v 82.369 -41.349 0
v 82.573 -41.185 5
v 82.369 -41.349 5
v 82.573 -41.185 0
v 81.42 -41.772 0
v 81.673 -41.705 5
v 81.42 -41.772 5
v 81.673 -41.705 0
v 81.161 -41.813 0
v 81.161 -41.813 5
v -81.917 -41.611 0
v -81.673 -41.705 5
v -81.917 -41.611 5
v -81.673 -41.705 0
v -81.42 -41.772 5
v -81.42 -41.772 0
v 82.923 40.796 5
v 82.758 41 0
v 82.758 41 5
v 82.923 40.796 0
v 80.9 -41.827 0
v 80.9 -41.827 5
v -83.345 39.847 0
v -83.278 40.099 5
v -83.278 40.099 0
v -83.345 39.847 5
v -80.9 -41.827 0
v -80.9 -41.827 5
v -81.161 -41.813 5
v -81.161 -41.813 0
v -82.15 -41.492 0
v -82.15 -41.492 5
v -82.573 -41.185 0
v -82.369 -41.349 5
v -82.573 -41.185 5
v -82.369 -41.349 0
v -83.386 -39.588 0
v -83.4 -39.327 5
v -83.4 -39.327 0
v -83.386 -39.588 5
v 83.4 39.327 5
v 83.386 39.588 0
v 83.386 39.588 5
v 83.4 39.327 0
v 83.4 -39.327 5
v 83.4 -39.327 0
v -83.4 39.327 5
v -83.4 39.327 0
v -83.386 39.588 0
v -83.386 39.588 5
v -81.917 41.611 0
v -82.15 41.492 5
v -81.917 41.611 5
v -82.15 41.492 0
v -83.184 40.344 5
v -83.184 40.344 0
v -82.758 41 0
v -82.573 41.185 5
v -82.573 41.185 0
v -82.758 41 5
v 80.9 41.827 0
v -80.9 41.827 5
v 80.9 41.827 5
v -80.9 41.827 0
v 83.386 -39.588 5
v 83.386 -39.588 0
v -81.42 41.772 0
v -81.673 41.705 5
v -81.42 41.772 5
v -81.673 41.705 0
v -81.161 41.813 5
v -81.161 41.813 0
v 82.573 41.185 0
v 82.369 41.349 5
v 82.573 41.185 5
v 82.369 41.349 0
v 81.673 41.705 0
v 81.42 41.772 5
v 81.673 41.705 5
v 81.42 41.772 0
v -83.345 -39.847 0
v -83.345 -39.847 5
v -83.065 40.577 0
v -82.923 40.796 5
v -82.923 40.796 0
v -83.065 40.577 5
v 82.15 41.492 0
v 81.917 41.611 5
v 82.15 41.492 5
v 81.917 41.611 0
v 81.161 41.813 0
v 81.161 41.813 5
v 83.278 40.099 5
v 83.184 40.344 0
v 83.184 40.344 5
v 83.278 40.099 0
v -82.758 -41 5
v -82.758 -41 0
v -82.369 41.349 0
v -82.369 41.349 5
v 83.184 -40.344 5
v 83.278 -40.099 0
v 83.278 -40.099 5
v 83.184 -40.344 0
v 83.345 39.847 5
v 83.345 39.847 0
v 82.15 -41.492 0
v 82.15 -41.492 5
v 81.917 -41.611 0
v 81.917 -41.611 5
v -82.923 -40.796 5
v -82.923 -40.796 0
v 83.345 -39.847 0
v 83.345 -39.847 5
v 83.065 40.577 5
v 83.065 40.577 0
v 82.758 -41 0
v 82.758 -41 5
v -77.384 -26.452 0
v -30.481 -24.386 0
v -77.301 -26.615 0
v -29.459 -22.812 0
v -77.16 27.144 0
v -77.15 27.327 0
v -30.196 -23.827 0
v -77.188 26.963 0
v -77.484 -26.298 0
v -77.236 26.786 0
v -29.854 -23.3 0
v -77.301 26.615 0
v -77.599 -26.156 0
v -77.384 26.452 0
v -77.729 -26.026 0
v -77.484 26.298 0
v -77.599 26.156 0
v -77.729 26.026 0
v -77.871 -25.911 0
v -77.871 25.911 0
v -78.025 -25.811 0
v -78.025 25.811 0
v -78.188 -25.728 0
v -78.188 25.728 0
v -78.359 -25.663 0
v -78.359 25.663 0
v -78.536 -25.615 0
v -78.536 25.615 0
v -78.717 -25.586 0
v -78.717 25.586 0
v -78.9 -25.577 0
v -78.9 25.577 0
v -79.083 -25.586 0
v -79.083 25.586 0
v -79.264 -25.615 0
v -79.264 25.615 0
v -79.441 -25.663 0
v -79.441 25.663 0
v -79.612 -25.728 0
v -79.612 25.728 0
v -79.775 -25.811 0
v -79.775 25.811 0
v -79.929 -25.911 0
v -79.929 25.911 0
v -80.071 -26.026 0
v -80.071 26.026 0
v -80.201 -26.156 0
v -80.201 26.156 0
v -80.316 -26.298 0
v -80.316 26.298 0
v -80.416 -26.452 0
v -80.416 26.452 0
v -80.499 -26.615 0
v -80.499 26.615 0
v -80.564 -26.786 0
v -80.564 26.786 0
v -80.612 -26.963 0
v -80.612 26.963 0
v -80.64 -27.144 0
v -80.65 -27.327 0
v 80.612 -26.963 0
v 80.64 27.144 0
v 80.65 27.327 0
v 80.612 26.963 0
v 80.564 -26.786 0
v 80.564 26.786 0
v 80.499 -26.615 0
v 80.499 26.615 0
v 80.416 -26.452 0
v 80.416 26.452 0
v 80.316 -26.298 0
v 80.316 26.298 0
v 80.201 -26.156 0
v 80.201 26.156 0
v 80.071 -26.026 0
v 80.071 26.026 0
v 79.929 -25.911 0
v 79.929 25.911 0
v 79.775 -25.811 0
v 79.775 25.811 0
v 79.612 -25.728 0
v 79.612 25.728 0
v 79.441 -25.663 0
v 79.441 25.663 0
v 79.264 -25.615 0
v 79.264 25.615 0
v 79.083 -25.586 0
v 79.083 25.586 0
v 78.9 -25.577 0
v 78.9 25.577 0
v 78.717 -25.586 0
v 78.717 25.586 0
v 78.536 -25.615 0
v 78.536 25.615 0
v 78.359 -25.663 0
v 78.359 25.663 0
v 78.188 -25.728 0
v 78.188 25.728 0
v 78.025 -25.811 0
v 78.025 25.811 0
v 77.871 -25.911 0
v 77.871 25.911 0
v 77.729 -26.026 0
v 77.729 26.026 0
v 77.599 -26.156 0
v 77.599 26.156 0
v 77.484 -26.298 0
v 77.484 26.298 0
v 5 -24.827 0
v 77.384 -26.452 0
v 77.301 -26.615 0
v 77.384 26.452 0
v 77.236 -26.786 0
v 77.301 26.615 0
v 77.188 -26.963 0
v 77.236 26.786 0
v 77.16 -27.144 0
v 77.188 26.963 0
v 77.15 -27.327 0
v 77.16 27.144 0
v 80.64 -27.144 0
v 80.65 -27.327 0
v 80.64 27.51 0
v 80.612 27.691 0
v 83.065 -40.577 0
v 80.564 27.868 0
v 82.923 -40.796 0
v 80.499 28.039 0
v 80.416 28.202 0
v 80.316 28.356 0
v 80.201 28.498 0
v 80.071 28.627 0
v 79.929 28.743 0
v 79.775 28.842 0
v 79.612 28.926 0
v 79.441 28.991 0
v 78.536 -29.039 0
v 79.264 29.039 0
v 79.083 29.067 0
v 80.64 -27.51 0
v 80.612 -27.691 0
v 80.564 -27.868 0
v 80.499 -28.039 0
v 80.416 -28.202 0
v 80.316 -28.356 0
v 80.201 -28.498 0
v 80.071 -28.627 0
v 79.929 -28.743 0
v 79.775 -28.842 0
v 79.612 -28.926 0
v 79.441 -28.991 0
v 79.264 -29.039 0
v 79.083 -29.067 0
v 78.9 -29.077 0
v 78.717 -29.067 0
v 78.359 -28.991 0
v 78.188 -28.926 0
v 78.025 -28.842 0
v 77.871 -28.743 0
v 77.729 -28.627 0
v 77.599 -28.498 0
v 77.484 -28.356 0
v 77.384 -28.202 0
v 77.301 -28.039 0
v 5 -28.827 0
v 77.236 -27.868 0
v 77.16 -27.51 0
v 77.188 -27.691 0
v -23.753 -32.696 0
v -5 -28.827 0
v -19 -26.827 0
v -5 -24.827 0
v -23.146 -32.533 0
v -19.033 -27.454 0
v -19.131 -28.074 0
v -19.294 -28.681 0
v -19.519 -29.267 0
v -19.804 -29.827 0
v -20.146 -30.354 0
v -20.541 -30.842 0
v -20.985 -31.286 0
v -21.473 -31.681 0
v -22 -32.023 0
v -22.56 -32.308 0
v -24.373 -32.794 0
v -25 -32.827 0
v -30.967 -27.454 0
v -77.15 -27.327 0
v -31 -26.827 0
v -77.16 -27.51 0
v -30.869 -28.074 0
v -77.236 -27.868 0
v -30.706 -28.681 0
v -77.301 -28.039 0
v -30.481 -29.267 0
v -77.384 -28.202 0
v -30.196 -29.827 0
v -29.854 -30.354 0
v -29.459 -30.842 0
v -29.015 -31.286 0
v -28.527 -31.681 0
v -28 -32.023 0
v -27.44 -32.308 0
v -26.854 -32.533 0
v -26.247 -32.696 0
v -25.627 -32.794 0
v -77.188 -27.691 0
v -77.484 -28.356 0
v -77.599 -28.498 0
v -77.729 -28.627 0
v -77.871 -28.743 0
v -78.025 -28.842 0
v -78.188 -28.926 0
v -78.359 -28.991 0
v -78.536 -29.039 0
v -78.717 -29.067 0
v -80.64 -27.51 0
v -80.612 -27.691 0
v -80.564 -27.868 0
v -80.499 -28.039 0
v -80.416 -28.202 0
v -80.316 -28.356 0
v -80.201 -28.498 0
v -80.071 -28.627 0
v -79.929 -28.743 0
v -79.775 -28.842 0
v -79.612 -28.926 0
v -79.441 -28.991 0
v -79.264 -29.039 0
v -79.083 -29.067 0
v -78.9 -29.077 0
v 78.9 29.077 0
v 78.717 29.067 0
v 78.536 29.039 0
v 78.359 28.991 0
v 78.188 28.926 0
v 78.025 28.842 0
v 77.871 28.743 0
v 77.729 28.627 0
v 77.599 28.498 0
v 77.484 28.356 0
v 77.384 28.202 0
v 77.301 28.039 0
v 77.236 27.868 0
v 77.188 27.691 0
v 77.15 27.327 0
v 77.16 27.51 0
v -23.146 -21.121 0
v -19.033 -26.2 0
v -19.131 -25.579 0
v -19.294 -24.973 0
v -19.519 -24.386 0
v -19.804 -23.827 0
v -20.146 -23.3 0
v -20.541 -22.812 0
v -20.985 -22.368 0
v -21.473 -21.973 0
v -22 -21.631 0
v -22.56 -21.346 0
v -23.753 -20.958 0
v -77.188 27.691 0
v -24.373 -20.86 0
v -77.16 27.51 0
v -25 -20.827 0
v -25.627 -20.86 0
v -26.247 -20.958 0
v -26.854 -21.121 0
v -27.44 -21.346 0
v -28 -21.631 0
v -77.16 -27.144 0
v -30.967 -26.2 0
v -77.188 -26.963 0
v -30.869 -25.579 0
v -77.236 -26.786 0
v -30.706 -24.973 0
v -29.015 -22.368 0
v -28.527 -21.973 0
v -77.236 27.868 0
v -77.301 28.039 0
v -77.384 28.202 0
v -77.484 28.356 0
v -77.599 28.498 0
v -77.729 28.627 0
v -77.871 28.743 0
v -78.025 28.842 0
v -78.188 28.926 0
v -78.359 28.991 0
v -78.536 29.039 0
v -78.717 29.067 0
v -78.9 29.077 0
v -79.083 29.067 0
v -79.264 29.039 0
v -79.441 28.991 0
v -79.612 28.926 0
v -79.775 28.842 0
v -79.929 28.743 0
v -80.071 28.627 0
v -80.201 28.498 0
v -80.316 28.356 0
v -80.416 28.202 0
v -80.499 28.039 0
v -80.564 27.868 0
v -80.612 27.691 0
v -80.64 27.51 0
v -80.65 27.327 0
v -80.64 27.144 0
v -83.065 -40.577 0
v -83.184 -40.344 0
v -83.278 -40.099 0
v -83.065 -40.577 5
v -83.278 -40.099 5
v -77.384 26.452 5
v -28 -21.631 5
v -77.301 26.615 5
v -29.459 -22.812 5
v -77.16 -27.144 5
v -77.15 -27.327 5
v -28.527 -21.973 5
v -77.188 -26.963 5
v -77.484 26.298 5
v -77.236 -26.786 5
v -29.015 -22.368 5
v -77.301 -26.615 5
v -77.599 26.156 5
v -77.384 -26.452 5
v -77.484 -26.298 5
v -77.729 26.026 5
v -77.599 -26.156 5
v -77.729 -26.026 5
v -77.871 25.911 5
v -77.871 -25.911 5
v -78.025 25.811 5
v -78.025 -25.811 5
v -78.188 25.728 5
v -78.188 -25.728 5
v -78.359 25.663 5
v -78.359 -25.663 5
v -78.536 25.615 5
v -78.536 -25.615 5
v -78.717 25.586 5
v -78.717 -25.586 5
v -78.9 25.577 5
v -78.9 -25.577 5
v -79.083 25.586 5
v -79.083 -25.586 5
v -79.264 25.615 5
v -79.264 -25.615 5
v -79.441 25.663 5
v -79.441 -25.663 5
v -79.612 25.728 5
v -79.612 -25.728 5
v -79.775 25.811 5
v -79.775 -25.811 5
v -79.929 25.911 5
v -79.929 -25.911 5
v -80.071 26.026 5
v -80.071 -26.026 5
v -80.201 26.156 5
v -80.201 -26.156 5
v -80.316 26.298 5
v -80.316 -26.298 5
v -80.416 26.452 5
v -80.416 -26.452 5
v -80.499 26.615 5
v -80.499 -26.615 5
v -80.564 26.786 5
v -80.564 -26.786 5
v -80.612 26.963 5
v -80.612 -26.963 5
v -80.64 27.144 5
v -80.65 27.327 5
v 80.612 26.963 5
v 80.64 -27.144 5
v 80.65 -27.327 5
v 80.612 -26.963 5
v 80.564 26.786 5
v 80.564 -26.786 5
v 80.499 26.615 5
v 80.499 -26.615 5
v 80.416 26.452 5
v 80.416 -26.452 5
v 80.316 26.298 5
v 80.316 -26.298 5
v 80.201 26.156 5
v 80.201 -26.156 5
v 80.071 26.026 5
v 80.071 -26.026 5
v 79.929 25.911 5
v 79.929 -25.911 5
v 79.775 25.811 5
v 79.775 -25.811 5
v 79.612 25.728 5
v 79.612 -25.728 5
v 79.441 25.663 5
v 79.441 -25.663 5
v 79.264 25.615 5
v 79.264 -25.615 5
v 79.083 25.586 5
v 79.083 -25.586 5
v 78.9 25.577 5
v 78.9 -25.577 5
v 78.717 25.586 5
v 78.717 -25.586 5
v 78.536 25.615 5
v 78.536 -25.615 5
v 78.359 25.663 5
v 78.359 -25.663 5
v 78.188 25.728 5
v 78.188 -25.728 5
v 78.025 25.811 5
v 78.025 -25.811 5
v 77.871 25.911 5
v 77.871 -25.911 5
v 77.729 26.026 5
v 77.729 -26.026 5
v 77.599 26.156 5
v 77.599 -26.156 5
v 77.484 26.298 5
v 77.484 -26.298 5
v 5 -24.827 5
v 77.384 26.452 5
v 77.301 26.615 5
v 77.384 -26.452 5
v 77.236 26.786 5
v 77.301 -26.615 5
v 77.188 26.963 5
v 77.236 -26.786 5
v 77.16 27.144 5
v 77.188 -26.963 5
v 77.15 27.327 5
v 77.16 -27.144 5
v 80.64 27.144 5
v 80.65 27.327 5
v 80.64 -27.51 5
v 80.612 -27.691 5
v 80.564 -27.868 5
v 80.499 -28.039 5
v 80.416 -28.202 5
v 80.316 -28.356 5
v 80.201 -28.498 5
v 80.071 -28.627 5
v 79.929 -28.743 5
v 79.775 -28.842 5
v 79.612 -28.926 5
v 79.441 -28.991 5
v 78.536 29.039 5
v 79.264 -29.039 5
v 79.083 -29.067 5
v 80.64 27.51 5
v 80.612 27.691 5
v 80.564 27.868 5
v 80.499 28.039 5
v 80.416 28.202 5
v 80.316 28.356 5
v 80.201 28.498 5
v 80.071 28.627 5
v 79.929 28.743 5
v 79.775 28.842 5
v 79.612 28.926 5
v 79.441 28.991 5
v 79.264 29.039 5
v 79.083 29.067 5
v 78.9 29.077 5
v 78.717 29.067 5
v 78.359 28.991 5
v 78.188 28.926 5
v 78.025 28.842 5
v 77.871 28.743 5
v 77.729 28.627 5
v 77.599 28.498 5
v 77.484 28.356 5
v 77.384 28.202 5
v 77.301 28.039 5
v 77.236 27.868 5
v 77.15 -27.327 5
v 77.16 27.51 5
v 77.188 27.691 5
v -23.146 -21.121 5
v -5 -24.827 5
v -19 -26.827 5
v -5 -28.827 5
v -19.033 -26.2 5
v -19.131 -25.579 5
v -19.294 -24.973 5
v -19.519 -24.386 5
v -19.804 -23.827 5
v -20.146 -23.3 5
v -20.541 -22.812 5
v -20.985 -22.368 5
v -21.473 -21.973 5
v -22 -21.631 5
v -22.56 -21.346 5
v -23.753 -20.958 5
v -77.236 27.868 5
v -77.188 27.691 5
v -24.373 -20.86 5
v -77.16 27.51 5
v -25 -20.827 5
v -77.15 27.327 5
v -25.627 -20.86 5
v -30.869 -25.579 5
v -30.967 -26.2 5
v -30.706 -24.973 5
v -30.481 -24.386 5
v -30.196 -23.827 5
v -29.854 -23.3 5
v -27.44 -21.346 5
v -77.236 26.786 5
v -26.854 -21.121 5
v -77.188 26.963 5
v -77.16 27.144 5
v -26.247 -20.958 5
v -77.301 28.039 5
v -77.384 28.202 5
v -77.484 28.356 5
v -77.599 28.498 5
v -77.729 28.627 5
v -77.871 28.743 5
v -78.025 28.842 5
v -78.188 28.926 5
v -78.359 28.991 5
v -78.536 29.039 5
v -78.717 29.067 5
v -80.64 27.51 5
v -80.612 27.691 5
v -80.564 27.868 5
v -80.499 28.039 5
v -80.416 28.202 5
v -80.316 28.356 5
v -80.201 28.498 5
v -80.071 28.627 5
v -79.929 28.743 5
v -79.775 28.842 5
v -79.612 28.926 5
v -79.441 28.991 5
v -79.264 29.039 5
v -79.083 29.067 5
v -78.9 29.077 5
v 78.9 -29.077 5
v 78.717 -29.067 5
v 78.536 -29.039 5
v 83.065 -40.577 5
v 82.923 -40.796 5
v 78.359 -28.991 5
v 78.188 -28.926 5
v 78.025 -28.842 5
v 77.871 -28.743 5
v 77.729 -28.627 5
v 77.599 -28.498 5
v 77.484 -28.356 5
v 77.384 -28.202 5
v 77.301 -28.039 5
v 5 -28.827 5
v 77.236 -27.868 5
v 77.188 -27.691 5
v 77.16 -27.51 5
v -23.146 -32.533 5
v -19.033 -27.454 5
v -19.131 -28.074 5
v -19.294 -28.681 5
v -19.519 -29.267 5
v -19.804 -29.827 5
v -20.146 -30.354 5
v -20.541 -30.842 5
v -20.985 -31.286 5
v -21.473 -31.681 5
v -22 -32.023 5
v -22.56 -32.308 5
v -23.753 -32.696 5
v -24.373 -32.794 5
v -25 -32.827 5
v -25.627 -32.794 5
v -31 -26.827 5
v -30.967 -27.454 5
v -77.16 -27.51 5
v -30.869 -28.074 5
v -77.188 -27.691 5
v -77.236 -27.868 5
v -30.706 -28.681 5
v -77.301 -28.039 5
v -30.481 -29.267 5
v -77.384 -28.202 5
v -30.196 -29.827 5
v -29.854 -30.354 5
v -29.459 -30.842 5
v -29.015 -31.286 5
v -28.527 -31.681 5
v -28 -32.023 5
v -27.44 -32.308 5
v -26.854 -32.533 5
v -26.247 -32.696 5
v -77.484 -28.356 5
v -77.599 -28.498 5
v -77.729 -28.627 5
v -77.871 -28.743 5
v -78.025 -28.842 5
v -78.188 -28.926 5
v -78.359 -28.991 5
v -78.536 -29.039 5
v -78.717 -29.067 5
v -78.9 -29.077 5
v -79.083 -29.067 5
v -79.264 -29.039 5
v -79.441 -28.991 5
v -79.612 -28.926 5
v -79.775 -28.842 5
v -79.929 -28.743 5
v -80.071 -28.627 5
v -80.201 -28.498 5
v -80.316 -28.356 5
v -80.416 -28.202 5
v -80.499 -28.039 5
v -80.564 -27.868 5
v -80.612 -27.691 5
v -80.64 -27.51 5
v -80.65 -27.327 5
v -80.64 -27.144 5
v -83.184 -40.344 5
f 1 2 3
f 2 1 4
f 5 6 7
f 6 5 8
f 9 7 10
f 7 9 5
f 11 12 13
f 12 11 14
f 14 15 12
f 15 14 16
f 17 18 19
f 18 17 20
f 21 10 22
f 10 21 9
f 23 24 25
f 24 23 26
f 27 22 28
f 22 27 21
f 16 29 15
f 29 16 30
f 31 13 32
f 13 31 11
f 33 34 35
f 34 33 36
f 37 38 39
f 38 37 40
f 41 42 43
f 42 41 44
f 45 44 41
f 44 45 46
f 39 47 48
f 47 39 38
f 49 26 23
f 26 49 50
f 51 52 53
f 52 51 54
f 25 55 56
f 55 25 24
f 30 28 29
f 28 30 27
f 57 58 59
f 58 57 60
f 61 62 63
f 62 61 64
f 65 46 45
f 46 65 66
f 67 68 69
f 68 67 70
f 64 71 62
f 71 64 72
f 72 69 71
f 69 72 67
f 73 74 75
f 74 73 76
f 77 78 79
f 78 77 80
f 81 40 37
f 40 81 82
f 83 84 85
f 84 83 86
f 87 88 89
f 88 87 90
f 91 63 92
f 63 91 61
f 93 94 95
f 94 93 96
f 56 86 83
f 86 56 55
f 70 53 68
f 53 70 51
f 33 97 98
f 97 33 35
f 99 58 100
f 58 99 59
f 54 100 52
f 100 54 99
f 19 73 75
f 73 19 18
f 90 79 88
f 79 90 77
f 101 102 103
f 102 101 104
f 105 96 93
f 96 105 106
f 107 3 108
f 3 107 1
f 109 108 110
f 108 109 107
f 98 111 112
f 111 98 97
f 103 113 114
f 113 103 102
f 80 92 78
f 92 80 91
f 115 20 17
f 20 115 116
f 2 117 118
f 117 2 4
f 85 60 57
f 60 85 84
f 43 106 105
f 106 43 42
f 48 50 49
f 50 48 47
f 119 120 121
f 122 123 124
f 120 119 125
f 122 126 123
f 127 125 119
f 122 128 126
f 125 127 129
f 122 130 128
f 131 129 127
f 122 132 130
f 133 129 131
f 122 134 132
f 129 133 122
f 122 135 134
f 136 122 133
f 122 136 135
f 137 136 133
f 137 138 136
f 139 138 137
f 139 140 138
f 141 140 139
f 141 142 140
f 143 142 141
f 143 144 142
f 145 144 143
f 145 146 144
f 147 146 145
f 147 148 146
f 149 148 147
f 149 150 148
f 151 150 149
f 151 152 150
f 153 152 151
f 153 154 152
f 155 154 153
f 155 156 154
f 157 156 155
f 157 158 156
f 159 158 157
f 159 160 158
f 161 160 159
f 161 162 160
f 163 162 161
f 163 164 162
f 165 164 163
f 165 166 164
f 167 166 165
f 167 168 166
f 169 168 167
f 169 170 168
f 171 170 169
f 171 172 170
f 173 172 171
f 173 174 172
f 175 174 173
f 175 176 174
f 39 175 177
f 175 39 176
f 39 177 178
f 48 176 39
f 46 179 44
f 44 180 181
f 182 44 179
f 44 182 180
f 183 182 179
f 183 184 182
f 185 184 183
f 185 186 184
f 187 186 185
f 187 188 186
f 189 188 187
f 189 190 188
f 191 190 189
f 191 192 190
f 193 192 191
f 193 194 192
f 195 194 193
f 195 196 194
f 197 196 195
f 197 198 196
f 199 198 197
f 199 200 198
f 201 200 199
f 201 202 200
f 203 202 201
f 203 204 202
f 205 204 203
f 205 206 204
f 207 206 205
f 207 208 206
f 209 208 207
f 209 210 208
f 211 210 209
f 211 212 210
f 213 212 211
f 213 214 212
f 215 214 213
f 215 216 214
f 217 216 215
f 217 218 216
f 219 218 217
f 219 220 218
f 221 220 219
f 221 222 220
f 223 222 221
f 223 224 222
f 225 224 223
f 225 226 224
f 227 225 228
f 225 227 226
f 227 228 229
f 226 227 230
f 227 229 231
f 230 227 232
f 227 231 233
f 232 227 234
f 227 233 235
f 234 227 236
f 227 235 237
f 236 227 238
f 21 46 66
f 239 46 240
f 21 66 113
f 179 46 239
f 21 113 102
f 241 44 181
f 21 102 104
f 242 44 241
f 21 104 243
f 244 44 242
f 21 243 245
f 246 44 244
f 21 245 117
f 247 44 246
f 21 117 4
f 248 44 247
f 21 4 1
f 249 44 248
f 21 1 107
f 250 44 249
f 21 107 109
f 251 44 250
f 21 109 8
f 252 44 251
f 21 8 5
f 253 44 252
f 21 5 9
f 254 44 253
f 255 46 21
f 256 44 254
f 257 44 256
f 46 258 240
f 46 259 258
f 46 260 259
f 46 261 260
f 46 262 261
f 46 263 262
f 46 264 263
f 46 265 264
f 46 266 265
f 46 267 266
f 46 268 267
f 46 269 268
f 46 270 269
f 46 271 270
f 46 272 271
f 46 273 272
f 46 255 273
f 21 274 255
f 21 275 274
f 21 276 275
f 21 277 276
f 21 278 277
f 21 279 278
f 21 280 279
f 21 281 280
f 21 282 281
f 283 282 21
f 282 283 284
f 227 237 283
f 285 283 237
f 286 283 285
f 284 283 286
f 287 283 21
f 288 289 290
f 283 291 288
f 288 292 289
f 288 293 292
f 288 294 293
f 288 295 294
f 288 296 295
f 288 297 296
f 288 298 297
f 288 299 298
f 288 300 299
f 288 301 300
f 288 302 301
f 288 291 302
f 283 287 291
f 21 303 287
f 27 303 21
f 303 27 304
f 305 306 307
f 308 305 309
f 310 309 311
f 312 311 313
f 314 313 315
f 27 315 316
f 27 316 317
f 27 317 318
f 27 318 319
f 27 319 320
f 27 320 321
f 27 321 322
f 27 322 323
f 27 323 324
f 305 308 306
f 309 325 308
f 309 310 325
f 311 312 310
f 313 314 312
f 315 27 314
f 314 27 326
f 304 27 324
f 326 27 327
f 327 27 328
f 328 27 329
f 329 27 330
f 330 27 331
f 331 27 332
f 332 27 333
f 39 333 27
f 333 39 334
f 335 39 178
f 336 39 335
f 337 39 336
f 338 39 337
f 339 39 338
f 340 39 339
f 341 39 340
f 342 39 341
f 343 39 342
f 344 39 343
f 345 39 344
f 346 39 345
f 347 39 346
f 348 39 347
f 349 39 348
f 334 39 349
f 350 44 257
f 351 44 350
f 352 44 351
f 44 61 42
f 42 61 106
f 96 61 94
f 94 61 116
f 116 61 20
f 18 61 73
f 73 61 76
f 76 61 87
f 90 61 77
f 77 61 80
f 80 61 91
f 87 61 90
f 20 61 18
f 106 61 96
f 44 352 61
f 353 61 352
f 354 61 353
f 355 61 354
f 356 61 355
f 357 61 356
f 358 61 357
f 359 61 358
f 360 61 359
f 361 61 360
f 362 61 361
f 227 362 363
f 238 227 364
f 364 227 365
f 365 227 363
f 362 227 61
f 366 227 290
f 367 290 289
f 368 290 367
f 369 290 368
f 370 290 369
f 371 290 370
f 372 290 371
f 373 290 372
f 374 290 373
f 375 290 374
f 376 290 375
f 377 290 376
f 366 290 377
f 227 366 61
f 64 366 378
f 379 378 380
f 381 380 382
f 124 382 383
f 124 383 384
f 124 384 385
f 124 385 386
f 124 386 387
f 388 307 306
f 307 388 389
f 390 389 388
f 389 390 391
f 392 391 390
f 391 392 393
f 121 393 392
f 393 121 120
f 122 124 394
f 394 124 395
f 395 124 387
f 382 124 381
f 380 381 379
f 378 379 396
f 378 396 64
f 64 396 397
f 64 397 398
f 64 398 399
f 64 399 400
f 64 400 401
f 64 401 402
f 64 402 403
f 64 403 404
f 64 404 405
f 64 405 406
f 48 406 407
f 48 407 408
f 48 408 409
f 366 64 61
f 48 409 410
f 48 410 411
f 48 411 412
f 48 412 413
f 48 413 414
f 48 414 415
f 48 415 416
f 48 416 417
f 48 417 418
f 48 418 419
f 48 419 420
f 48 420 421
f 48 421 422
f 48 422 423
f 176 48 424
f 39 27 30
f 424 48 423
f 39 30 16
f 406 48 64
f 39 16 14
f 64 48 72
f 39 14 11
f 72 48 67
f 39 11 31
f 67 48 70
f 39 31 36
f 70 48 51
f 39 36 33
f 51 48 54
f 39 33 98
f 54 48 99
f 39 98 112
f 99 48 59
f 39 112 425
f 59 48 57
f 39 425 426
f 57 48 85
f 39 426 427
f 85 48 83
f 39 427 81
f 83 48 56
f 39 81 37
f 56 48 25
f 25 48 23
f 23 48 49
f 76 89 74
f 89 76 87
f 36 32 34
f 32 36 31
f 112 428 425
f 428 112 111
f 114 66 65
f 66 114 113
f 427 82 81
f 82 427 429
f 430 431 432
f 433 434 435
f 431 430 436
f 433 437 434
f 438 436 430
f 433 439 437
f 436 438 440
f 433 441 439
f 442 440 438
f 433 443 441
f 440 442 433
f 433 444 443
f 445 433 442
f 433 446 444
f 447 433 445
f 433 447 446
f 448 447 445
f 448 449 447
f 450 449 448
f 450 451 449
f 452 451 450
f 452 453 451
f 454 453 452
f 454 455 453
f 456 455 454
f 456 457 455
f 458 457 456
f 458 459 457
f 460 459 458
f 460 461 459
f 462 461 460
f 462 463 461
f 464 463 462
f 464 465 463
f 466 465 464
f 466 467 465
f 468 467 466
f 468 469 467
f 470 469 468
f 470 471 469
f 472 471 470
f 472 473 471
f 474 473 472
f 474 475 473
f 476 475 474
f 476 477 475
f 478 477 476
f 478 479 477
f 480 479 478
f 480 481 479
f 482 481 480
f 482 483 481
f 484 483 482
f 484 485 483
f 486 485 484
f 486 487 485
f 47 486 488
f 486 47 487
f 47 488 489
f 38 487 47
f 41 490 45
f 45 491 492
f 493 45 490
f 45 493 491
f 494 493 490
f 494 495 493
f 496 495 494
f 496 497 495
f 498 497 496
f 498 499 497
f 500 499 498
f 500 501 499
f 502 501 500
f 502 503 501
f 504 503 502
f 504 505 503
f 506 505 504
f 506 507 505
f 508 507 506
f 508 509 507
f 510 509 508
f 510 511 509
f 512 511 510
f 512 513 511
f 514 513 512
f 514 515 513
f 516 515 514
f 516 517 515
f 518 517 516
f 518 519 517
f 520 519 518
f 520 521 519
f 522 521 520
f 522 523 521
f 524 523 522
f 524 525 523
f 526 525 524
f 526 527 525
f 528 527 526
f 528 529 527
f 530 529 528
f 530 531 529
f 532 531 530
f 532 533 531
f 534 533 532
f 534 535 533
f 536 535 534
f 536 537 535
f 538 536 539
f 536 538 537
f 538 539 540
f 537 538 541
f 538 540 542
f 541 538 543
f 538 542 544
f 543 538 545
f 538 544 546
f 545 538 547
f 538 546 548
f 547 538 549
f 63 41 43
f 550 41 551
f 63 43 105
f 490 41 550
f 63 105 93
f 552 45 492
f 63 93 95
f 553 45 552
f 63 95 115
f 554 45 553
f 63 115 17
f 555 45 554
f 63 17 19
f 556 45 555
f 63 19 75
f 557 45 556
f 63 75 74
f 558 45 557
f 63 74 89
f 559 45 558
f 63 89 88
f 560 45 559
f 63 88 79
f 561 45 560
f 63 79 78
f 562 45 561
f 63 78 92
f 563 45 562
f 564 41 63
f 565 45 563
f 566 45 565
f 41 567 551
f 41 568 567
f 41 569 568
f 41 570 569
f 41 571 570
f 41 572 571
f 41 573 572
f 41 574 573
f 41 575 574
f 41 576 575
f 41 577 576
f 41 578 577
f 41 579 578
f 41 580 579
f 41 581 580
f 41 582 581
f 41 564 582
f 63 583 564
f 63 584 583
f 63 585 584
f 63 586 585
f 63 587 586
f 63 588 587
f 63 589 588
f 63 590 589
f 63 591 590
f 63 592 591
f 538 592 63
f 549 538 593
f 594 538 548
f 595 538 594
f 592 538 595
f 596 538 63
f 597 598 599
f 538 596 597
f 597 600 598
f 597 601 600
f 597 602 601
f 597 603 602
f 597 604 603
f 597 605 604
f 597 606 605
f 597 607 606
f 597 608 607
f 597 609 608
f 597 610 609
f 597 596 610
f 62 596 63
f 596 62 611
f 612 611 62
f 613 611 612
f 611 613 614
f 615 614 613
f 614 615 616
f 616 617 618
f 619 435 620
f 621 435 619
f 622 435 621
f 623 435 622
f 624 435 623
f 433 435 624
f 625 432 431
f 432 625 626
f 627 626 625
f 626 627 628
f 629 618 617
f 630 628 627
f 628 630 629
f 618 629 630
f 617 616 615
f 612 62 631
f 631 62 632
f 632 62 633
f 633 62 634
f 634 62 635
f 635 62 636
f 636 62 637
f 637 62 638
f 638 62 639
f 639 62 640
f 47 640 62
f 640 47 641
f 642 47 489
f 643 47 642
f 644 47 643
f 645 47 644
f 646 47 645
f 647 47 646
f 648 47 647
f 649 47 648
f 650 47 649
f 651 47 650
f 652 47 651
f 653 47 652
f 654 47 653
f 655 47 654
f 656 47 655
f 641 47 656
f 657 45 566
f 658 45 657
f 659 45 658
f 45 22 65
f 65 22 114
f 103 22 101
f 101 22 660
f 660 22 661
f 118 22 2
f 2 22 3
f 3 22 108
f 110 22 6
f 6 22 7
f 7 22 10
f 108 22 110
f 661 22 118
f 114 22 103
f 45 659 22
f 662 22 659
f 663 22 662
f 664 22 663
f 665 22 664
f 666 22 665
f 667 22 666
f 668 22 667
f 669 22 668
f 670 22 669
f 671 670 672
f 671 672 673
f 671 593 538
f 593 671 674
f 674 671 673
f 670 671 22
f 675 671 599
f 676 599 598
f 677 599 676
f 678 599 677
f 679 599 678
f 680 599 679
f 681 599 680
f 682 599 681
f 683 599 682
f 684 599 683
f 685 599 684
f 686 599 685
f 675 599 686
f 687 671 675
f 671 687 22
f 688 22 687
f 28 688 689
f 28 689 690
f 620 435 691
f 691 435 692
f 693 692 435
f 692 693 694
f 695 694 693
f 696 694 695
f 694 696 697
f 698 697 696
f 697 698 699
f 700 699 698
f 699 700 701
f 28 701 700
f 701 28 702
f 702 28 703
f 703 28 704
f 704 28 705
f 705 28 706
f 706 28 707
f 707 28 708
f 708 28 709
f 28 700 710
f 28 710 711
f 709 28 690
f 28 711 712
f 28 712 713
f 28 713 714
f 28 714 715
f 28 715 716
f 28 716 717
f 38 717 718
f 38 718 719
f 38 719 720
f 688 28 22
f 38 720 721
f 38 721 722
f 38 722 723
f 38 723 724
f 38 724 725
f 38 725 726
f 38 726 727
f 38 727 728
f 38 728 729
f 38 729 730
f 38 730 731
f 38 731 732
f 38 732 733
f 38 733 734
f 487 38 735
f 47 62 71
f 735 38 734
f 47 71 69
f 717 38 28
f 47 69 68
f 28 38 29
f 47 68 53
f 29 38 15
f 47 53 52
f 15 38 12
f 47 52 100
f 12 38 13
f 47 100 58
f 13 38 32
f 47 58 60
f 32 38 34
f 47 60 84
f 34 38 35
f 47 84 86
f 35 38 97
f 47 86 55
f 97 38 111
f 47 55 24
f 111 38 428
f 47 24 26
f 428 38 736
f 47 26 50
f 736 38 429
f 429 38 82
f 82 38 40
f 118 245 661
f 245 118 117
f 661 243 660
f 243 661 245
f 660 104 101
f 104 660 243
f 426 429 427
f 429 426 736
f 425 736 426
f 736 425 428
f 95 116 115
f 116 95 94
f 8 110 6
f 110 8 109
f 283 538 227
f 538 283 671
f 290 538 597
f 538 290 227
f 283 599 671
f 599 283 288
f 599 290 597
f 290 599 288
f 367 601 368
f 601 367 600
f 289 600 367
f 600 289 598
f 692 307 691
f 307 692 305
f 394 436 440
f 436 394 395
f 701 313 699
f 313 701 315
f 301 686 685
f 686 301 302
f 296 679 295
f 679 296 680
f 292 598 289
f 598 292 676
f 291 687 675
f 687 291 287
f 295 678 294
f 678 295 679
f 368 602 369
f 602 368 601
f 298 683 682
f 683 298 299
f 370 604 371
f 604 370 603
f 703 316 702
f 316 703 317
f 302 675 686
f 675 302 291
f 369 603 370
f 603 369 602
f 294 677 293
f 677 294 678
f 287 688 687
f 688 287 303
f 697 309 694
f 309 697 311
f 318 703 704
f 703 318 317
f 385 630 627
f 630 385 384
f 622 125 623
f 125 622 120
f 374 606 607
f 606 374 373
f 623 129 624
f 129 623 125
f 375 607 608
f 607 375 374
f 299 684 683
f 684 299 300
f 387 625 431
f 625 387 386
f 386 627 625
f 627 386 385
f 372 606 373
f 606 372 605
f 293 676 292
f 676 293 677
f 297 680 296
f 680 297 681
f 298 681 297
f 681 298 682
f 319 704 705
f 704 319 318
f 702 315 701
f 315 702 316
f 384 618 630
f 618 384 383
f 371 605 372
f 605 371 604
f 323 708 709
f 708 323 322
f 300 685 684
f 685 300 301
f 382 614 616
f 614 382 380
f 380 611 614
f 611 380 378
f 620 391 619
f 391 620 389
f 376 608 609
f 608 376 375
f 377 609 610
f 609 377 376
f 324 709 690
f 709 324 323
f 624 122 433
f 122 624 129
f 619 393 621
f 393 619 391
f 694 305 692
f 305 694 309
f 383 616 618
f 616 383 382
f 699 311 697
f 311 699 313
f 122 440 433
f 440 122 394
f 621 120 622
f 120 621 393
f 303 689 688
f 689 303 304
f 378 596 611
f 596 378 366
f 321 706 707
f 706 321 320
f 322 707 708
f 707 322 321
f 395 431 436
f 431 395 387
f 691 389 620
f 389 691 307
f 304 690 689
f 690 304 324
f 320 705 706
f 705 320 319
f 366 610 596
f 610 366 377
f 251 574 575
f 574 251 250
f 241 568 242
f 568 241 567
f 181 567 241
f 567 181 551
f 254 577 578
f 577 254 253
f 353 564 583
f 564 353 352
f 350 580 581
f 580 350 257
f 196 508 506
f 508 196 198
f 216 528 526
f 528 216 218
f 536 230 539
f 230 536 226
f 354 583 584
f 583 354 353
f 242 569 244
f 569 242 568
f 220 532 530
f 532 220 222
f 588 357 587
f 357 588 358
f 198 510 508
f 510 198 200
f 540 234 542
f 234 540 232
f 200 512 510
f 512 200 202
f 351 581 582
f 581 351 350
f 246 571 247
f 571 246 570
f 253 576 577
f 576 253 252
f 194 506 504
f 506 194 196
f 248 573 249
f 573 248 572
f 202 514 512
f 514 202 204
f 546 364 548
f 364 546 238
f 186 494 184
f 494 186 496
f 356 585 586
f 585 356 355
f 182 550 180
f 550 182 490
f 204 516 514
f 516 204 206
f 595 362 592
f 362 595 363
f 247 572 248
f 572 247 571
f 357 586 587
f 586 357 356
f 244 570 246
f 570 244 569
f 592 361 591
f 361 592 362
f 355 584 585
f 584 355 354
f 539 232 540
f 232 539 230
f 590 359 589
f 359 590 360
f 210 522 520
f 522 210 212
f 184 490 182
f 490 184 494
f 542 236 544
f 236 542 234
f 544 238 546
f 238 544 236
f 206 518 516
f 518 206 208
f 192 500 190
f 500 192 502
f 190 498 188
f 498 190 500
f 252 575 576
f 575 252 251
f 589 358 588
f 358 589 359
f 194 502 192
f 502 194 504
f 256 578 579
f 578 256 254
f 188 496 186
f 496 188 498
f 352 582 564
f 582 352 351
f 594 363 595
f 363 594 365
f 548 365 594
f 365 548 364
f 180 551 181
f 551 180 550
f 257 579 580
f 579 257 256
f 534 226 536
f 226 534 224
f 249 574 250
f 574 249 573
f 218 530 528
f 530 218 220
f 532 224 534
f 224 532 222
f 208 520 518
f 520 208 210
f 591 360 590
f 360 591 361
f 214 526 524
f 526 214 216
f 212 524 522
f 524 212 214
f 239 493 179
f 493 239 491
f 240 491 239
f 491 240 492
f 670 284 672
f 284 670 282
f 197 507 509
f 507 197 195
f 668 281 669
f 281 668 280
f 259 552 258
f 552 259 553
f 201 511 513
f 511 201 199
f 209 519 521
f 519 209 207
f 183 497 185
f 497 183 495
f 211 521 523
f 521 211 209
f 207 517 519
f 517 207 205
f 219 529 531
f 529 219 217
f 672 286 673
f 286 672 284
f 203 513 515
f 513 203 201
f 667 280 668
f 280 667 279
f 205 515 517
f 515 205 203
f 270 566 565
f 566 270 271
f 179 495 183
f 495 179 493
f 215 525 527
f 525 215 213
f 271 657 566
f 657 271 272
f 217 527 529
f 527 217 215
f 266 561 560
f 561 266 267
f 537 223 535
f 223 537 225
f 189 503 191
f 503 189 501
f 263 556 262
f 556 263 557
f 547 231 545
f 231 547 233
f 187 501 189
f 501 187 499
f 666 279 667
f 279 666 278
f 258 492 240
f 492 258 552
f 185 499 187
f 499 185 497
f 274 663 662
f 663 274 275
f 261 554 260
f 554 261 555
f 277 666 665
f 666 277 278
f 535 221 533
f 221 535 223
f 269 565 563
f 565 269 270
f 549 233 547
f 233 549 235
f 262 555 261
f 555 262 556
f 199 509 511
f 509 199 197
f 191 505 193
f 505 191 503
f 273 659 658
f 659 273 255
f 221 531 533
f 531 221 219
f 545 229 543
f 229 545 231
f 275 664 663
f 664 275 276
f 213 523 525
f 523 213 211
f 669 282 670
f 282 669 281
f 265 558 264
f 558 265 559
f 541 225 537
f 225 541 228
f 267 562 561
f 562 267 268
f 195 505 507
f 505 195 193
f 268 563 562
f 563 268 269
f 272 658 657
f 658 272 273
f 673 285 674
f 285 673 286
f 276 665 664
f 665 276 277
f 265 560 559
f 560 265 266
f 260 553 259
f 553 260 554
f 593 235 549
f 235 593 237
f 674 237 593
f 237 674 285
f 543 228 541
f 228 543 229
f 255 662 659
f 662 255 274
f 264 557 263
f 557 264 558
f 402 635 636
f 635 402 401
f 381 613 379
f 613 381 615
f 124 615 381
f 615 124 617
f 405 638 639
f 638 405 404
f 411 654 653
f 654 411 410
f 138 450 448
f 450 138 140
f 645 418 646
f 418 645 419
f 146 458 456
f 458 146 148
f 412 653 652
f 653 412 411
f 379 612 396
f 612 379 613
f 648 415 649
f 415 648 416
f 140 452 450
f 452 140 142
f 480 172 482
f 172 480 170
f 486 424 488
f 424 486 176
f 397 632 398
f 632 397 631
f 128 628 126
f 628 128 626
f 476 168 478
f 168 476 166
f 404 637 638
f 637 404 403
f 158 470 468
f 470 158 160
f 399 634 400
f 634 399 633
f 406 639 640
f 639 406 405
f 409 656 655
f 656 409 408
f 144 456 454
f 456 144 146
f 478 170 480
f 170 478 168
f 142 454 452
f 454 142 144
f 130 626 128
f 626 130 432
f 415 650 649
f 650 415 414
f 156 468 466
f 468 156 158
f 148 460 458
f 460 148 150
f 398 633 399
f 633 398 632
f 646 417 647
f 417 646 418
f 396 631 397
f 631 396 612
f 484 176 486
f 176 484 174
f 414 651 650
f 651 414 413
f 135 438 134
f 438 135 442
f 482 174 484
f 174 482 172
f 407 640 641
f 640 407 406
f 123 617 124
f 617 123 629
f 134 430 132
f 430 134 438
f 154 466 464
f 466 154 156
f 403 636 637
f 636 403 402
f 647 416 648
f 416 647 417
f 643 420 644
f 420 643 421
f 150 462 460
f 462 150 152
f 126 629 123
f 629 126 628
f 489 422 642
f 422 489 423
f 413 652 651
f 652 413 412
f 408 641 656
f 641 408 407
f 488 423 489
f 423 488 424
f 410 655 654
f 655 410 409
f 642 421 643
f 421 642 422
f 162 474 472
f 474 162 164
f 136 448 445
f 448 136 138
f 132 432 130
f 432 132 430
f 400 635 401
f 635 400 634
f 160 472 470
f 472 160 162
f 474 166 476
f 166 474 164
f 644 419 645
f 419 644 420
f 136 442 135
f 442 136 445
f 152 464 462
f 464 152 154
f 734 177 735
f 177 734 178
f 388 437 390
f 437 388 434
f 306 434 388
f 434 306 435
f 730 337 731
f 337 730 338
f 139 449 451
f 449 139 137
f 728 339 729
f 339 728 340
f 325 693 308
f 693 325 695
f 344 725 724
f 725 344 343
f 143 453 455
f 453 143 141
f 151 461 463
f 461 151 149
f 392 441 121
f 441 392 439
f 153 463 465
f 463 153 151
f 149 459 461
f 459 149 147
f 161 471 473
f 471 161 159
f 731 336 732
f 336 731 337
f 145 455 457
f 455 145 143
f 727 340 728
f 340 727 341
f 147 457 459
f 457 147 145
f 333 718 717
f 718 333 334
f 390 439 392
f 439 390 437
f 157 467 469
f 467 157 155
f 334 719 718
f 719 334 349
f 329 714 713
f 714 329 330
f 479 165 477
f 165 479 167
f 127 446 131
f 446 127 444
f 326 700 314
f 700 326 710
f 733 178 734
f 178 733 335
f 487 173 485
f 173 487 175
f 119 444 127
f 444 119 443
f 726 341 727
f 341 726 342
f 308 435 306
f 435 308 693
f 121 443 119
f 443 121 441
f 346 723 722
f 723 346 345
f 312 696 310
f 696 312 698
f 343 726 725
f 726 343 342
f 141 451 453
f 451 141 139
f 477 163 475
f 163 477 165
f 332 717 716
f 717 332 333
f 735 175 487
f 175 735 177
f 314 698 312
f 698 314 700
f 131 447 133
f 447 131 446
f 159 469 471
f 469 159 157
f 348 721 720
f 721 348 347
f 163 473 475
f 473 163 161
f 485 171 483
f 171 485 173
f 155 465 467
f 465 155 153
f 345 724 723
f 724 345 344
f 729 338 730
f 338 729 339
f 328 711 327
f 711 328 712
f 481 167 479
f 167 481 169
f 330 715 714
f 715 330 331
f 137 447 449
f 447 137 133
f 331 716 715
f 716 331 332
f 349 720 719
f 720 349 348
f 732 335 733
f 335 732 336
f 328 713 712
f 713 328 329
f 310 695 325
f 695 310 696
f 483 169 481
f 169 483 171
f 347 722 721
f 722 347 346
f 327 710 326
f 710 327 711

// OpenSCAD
// file: chromacade-config.scad
// chromacade-config.scad
// Shared variables for ChromaCade modules

$fn = 60;

// --- Global Dimensions (Converted from inches) ---
in2mm = 25.4;
case_w = 7    * in2mm;     // 177.8mm
case_d = 4.5  * in2mm;     // 114.3mm
wall   = 5;                // Chunky 5mm walls

front_h = 1.75 * in2mm;   // 44.45mm
shelf_d = 1.5  * in2mm;   // 38.1mm
shelf_a = 8;               // Degrees tilted forward (down towards front)
panel_l = 2.5  * in2mm;   // 63.5mm
panel_a = 45;              // Degrees slope

// Speaker enclosure & cone dims
spk_grille_w = 65;   // grille width
spk_grille_h = 30;   // grille height
spk_cx       = 45;   // speaker centre offset from case centreline

// --- Profile Coordinate Math (Y = depth, Z = height) ---
// Origin is bottom-back (0,0)
p0 = [0, 0];
p1 = [case_d, 0];
p2 = [case_d, front_h];
p3 = [case_d - shelf_d*cos(shelf_a), front_h + shelf_d*sin(shelf_a)];
p4 = [p3[0] - panel_l*cos(panel_a), p3[1] + panel_l*sin(panel_a)];
p5 = [0, p4[1]];

case_h = p4[1];  // Overall height derived from math (~128mm)

// --- Boss Placement Coordinates ---
boss_x     = case_w/2 - wall - 5;
boss_z_top = case_h - wall - 15;
boss_z_bot = wall + 15;
boss_len   = 10;
// main file
include <chromacade-config.scad>

// Render flat on the bed for 3D printing
back_panel_flat();

// Flatten the assembled panel onto the bed
module back_panel_flat() {
    translate([0, 0, wall/2])
    rotate([-90, 0, 0])
    translate([0, -wall/2, -case_h/2])
    back_panel_assembled();
}

// Original assembled position
module back_panel_assembled() {
    w = case_w - wall*2 - 1;  // 1mm clearance tolerance
    h = case_h - wall*2 - 1;

    // Put in place: flush at Y=0, extending to Y=wall
    translate([0, wall/2, case_h/2])
    difference() {
        // Main Plate
        rotate([90, 0, 0])
        linear_extrude(wall, center=true)
        offset(r=2.5) offset(r=-2.5) square([w, h], center=true);

        // USB-C Port Cutout
        // standard USB-C receptacle is 9.5×3.5mm; 10×4 gives 0.5mm margin
        translate([0, 0, -h/2 + 15])
        cube([10, wall*4, 4], center=true);

        // Power Switch Cutout (12mm standard toggle/rocker)
        translate([-25, 0, -h/2 + 15])
        rotate([90, 0, 0])
        cylinder(h=wall*4, d=12, center=true);

        // Screw holes (aligned to boss coordinates)
        translate([ boss_x, 0,  boss_z_top - case_h/2]) rotate([90,0,0]) cylinder(h=wall*4, d=3.5, center=true);
        translate([ boss_x, 0,  boss_z_bot - case_h/2]) rotate([90,0,0]) cylinder(h=wall*4, d=3.5, center=true);
        translate([-boss_x, 0,  boss_z_top - case_h/2]) rotate([90,0,0]) cylinder(h=wall*4, d=3.5, center=true);
        translate([-boss_x, 0,  boss_z_bot - case_h/2]) rotate([90,0,0]) cylinder(h=wall*4, d=3.5, center=true);
    }
}
